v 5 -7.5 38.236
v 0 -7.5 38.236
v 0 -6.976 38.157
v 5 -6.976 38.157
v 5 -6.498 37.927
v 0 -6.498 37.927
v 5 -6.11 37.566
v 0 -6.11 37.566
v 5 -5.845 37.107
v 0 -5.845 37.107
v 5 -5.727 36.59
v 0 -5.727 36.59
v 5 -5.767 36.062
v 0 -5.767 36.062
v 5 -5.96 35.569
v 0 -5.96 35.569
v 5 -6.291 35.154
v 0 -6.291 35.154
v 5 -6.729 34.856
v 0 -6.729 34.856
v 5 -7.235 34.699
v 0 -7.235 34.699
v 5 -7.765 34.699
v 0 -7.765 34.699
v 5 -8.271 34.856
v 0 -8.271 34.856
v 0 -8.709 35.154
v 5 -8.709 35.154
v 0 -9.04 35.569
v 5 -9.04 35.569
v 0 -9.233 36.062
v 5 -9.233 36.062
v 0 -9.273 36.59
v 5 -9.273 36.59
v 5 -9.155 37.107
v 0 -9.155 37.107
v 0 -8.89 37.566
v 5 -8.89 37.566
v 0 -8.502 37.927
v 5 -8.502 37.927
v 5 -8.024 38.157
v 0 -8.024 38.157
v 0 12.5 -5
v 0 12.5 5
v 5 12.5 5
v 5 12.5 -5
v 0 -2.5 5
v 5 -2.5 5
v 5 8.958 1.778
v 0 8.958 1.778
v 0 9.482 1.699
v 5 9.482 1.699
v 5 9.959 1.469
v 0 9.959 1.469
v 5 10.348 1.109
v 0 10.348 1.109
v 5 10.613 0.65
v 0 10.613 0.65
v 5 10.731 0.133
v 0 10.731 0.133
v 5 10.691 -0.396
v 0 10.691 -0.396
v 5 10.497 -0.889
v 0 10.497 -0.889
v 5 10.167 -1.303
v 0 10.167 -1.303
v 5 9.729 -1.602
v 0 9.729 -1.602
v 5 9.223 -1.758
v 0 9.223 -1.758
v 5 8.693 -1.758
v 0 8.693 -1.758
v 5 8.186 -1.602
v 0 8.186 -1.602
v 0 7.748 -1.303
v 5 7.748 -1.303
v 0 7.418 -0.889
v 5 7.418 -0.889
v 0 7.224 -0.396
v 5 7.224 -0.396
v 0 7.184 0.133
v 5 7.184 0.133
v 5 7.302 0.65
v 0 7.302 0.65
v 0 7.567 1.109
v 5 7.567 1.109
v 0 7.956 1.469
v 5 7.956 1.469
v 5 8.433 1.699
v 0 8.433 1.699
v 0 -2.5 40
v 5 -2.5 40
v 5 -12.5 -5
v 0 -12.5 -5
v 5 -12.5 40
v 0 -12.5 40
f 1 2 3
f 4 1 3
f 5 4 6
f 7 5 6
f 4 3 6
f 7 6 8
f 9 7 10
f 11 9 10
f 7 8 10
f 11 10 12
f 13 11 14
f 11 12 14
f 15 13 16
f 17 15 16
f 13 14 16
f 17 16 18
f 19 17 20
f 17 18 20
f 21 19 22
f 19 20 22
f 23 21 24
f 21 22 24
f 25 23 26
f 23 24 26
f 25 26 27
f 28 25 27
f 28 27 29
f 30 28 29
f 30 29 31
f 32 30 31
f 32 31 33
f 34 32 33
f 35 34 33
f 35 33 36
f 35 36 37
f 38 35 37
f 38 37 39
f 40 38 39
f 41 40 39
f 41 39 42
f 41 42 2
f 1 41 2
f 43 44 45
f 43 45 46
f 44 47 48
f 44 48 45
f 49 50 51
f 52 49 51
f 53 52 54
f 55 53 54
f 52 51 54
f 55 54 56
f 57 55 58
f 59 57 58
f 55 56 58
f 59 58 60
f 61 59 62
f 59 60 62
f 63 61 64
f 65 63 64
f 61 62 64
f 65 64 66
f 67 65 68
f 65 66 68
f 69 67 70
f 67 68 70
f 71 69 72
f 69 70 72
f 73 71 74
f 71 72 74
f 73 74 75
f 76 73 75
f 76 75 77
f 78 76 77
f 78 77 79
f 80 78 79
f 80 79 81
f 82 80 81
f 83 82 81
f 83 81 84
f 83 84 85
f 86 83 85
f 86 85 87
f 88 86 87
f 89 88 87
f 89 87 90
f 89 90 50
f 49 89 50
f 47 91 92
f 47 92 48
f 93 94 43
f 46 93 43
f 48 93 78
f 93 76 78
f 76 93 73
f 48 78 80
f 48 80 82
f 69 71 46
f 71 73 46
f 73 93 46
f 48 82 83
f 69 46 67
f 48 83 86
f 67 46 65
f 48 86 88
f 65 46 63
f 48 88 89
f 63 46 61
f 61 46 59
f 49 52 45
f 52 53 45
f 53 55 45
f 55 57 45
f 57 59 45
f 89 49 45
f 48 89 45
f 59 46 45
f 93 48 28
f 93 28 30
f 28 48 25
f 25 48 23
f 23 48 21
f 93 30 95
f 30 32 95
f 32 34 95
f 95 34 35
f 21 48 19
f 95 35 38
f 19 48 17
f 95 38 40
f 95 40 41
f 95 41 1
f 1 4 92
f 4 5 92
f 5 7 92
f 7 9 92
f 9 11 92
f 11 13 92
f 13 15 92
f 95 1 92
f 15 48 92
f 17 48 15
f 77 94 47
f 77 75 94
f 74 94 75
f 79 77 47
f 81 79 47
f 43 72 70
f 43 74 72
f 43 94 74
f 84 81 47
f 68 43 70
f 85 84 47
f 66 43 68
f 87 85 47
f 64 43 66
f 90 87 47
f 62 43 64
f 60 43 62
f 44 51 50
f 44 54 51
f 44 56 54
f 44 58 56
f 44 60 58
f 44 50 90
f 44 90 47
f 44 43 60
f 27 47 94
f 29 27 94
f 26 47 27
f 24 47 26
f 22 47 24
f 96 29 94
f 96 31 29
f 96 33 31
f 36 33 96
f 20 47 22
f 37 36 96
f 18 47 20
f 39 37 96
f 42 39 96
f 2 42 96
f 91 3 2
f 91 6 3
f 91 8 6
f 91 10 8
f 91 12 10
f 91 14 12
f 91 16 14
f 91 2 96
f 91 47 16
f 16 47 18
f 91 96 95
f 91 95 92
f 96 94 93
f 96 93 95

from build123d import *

# Parameters (mm, degrees)
BOSS_EXTRUDE1_DEPTH          = 5
F_5_32_0_14_DIAMETER_HOLE1_D = 3.556


with BuildPart() as part:
    # Sketch1 → Boss-Extrude1 (new body)
    with BuildSketch(Plane(origin=(0, 0, 0), x_dir=(0, 0, -1), z_dir=(1, 0, 0))):
        Polygon((-40, -2.5), (-5, -2.5), (-5, 12.5), (5, 12.5), (5, -2.5), (5, -12.5), (-40, -12.5), align=None)
    extrude(amount=BOSS_EXTRUDE1_DEPTH)

    # 5/32 (0.14) Diameter Hole1 (through all)
    with Locations(Plane(origin=(5, 0, 0), x_dir=(0, 0, -1), z_dir=(1, 0, 0))):
        with Locations((0, 8.957513111), (-36.457513111, -7.5)):
            Hole(F_5_32_0_14_DIAMETER_HOLE1_D / 2)


solid = part.part
